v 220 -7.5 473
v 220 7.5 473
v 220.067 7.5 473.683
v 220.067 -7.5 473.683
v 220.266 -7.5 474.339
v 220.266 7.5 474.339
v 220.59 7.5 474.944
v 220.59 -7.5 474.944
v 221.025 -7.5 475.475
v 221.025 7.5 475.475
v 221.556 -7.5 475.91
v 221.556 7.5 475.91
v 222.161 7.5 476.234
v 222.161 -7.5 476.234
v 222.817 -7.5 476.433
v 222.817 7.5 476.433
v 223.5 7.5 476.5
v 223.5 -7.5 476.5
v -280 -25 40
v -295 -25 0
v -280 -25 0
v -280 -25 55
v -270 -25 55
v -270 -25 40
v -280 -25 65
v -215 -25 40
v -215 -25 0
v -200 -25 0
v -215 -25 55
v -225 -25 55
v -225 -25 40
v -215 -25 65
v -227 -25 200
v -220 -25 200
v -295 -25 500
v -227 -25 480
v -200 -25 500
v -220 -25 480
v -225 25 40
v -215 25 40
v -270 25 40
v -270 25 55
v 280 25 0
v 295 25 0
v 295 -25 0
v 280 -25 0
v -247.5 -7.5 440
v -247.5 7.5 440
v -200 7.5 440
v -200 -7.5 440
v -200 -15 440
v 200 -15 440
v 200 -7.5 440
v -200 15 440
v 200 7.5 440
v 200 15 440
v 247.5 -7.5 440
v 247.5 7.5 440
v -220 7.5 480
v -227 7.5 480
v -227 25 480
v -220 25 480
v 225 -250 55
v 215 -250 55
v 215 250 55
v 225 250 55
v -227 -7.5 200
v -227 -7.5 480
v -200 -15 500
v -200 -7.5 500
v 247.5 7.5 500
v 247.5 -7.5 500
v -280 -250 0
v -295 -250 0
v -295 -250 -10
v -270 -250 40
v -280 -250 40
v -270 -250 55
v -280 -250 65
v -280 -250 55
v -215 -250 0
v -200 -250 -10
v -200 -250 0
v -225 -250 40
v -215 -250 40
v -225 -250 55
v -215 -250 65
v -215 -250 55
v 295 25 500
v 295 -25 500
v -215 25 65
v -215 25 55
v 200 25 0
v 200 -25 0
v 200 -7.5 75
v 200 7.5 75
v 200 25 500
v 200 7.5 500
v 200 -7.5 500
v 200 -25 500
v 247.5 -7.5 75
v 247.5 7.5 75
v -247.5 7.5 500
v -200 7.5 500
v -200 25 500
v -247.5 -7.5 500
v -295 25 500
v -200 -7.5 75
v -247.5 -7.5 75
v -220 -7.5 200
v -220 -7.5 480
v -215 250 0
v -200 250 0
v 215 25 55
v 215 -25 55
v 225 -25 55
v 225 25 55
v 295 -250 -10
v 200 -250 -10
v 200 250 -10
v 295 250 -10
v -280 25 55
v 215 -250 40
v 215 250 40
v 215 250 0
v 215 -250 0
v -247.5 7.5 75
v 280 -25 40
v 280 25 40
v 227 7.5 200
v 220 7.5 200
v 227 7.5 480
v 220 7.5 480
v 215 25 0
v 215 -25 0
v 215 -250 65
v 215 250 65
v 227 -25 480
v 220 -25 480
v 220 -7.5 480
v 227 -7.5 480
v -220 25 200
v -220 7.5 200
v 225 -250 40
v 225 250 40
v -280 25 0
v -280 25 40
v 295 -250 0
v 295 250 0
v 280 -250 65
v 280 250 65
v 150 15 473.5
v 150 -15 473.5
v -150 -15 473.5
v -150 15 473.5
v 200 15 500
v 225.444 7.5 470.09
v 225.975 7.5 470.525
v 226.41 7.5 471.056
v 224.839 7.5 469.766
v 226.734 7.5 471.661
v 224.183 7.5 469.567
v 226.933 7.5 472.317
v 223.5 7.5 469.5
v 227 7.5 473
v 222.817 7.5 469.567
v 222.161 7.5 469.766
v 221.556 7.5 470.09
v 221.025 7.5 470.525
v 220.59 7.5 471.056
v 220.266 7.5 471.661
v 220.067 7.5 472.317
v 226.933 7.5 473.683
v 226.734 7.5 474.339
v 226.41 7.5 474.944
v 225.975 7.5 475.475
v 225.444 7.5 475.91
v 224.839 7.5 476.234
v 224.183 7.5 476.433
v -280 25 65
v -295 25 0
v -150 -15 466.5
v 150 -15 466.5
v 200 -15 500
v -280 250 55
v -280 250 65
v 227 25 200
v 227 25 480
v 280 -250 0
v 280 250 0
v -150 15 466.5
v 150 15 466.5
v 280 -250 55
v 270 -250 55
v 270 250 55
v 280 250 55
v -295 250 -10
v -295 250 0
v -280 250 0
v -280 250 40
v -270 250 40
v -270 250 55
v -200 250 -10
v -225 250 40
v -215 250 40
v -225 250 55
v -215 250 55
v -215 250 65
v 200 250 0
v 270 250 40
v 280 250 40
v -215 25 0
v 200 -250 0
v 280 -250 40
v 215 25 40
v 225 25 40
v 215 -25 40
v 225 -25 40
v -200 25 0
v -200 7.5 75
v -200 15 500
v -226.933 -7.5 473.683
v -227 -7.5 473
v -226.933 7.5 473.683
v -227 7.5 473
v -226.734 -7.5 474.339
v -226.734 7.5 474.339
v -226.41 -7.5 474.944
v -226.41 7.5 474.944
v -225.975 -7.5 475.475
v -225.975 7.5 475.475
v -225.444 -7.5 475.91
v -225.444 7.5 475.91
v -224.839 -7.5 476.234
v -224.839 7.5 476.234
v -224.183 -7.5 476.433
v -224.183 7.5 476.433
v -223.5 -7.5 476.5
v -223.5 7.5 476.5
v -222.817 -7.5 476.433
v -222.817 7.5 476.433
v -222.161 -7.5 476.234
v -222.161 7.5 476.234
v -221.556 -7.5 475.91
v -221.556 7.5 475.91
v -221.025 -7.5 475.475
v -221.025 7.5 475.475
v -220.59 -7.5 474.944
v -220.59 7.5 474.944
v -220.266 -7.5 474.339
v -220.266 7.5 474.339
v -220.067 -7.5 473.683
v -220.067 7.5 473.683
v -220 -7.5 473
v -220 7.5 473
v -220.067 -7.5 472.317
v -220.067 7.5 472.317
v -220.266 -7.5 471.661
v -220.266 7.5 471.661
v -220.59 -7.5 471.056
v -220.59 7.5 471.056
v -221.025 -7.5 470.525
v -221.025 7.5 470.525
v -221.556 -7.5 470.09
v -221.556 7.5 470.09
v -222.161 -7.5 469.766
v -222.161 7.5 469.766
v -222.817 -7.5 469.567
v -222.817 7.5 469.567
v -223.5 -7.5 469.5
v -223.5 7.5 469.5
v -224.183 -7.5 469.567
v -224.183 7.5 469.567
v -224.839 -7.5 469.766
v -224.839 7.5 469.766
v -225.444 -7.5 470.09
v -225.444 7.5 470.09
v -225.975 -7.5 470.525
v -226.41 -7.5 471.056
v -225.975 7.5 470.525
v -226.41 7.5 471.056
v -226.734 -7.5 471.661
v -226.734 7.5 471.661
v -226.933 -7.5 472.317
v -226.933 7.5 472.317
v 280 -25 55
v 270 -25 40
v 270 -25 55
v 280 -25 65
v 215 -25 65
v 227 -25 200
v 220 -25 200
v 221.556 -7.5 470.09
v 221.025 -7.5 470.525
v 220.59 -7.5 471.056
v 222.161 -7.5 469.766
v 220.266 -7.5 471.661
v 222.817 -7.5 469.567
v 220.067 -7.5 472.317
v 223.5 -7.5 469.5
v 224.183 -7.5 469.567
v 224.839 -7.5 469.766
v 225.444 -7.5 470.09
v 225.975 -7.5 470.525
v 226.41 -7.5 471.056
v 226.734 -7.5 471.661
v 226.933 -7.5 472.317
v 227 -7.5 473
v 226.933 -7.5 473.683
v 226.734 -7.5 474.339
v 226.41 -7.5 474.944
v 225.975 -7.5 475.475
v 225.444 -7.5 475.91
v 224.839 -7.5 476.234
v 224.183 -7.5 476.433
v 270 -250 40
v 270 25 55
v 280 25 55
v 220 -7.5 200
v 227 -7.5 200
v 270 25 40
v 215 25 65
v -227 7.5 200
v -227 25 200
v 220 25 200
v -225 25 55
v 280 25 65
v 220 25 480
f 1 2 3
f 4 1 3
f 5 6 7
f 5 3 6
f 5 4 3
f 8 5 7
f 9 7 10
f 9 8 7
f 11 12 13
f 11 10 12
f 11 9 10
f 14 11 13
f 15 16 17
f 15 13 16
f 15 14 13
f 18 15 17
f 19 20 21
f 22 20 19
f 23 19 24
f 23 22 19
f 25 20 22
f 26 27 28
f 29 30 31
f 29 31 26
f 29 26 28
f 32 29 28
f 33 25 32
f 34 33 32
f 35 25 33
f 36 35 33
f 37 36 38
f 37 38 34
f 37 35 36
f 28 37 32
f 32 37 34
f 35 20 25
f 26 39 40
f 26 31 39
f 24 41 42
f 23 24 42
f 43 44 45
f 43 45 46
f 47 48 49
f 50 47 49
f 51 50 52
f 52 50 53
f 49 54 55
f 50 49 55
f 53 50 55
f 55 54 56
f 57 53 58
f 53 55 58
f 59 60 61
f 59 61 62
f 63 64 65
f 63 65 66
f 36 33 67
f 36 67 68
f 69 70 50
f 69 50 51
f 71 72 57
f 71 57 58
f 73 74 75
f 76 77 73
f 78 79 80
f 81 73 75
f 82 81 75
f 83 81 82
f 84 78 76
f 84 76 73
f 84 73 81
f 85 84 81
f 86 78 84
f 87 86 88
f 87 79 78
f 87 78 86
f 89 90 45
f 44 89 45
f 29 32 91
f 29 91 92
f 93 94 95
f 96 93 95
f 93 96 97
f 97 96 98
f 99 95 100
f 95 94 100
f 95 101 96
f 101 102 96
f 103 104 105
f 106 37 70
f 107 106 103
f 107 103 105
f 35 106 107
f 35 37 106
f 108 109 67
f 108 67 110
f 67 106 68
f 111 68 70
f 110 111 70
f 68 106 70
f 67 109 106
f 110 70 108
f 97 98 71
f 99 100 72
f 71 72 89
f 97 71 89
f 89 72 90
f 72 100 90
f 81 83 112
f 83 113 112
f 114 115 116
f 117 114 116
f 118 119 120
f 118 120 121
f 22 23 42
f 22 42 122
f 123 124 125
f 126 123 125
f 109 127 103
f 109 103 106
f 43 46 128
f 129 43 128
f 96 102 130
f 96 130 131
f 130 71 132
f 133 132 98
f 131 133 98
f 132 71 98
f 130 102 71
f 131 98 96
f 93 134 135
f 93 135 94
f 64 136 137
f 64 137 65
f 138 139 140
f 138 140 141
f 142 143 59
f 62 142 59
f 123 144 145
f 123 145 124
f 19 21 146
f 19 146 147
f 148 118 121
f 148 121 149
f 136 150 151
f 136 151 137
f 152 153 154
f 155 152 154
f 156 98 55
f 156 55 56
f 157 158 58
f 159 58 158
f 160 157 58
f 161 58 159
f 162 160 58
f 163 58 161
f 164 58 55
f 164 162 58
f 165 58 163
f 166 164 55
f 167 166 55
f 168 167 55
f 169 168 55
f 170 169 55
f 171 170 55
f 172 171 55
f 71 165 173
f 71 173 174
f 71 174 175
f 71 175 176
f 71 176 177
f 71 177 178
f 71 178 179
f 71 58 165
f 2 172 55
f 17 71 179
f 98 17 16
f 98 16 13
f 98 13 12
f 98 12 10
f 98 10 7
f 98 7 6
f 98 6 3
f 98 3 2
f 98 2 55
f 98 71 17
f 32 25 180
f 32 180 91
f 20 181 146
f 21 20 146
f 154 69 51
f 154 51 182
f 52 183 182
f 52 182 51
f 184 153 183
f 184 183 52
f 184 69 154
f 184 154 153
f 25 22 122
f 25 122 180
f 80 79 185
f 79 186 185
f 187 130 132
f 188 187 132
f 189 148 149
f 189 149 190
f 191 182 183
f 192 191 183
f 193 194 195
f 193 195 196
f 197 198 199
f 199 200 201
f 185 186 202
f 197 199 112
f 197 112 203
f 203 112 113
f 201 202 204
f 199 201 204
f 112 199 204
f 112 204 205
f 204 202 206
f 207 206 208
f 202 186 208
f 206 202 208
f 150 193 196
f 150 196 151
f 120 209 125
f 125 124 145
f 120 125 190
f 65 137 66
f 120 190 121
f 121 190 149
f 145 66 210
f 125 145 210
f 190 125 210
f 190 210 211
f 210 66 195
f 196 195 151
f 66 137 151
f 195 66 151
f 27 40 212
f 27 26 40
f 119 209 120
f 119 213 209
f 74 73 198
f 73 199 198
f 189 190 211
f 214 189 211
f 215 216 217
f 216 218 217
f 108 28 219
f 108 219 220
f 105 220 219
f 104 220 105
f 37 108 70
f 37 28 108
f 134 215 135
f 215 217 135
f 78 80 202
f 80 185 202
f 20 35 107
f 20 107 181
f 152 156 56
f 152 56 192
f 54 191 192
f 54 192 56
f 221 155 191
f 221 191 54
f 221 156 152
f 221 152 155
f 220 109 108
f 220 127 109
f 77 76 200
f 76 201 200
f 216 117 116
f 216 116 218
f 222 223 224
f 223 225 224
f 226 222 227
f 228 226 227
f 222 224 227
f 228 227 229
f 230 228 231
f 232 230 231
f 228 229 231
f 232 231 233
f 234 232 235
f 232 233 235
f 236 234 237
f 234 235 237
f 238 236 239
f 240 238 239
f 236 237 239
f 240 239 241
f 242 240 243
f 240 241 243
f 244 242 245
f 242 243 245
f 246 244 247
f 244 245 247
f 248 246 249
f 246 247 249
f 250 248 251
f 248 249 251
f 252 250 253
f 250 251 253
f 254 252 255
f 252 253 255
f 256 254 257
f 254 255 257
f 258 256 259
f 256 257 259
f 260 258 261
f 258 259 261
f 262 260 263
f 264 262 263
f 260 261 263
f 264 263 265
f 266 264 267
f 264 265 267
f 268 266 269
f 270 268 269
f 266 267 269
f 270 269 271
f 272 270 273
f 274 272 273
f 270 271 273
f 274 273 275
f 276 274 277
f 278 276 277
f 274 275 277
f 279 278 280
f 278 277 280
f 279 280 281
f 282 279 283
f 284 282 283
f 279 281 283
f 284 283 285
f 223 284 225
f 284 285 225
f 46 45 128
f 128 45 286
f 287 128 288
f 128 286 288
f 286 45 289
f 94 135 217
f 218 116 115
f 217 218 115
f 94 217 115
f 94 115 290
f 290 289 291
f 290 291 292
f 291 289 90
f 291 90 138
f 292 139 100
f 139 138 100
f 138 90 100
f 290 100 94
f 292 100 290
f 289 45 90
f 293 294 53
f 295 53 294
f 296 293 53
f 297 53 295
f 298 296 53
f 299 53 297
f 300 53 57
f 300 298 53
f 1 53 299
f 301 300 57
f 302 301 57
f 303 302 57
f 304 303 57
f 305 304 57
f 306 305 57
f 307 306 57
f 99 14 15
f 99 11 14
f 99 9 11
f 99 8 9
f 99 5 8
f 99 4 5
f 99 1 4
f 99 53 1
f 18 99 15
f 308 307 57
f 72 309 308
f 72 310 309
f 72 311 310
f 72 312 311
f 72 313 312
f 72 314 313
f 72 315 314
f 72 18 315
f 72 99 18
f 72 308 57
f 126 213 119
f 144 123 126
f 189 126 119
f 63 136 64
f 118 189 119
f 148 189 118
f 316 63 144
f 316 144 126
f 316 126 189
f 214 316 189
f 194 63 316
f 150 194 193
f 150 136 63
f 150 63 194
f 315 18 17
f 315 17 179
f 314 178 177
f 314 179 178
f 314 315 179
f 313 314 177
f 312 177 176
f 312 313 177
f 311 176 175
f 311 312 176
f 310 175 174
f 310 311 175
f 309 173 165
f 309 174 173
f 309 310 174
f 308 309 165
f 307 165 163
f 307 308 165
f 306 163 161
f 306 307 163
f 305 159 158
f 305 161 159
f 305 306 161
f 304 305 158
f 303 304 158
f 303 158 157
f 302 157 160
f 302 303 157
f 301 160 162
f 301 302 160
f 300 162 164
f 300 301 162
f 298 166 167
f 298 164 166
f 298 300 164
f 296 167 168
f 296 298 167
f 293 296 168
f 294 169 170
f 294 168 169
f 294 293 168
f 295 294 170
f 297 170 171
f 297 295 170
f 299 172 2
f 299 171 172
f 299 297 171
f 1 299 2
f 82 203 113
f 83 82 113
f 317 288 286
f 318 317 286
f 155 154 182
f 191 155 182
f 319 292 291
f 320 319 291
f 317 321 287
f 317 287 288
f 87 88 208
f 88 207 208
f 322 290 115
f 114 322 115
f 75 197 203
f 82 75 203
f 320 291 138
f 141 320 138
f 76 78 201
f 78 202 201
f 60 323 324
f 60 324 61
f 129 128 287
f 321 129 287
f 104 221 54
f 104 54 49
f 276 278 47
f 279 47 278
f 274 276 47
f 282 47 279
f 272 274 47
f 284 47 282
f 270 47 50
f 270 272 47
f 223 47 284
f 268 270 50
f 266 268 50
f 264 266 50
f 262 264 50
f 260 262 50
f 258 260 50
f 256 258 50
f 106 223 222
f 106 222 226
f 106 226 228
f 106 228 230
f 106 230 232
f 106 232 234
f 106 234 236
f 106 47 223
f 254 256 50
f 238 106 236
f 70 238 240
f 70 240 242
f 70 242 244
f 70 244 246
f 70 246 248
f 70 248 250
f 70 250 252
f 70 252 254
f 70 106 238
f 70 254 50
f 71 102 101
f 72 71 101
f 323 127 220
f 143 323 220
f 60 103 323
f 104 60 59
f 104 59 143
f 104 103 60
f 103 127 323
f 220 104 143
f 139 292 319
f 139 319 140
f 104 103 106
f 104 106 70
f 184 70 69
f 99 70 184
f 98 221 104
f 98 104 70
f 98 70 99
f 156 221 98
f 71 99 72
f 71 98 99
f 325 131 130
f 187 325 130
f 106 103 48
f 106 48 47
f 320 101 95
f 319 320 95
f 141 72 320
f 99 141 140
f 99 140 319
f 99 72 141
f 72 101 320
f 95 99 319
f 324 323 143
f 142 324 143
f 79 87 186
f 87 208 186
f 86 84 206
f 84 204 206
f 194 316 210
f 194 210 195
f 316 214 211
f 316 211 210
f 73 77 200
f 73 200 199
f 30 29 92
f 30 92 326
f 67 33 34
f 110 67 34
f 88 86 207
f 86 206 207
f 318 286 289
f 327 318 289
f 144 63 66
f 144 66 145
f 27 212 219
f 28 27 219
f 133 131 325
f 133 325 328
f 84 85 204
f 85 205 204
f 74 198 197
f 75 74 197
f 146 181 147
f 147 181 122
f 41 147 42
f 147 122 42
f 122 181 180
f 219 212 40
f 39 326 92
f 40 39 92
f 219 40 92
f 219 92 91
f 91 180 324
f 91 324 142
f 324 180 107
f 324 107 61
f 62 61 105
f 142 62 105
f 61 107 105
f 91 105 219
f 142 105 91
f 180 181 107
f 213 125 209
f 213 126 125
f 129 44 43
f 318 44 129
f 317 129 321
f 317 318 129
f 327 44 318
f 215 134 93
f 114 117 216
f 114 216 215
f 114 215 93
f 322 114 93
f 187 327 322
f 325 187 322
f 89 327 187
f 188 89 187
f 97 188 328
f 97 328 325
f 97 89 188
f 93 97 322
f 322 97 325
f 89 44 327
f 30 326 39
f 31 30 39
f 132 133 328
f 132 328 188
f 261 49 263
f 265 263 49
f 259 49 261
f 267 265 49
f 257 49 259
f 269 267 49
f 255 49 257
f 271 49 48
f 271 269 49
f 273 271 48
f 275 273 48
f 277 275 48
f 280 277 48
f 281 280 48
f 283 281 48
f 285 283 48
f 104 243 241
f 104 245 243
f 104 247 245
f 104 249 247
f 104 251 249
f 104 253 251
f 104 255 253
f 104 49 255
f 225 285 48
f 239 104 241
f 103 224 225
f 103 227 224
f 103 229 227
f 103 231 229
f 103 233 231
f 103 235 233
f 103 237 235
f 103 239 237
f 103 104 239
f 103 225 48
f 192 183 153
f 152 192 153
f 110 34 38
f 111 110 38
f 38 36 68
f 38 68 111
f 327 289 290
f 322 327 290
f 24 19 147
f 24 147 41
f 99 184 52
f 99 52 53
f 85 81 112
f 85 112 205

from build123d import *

# Parameters (mm, degrees)
F1_DEPTH  = 250
F3_DEPTH  = 25
F4_W      = 47.5
F4_H      = 7.5
F5_DEPTH  = 425
F7_W      = 7
F7_H      = 280
F8_DEPTH  = 110
F10_DEPTH = 60
F11_R     = 3.5
F12_DEPTH = 56
F14_DEPTH = 46


with BuildPart() as f1:
    # F0 (on Front) → F1 (new body, symmetric)
    with BuildSketch(Plane.XZ):
        Polygon((-200, -10), (-200, 0), (-215, 0), (-280, 0), (-295, 0), (-295, -10), (-280, -10), align=None)
        Polygon((215, 0), (200, 0), (200, -10), (280, -10), (295, -10), (295, 0), (280, 0), align=None)
        Polygon((-280, 0), (-215, 0), (-215, 40), (-225, 40), (-225, 55), (-215, 55), (-215, 65), (-280, 65), (-280, 55), (-270, 55), (-270, 40), (-280, 40), align=None)
        Polygon((215, 40), (215, 0), (280, 0), (280, 40), (270, 40), (270, 55), (280, 55), (280, 65), (215, 65), (215, 55), (225, 55), (225, 40), align=None)
    extrude(amount=F1_DEPTH, both=True)


with BuildPart() as f3:
    # F2 (on Front) → F3 (new body, symmetric)
    with BuildSketch(Plane.XZ):
        Polygon((-215, 0), (-200, 0), (-200, 500), (-295, 500), (-295, 0), (-280, 0), (-280, 40), (-270, 40), (-270, 55), (-280, 55), (-280, 65), (-215, 65), (-215, 55), (-225, 55), (-225, 40), (-215, 40), align=None)
    extrude(amount=F3_DEPTH, both=True)

    # F4 (on face) → F5 (cut)
    with BuildSketch(Plane.XY.offset(500)):
        with Locations((-223.75, -3.75)):
            Rectangle(F4_W, F4_H)
        with Locations((-223.75, 3.75)):
            Rectangle(F4_W, F4_H)
    extrude(amount=-F5_DEPTH, mode=Mode.SUBTRACT)


with BuildPart() as f6_1:
    # F6: instance of F3
    add(f3.part.mirror(Plane.YZ))


with BuildPart() as f8_tool:
    # F7 (on face) → F8 (new body)
    with BuildSketch(Plane.XZ.offset(25)):
        with Locations((-223.5, 340)):
            Rectangle(F7_W, F7_H)
        with Locations((223.5, 340)):
            Rectangle(F7_W, F7_H)
    extrude(amount=-F8_DEPTH)


with BuildPart() as f3_1:
    add(f3.part)

    # F8: cut by f8_tool
    add(f8_tool.part, mode=Mode.SUBTRACT)


with BuildPart() as f6_1_1:
    add(f6_1.part)

    # F8: cut by f8_tool
    add(f8_tool.part, mode=Mode.SUBTRACT)


with BuildPart() as f10:
    # F9 (on face) → F10 (new body)
    with BuildSketch(Plane.XY.offset(500)):
        Polygon((-200, -7.5), (-200, -15), (0, -15), (200, -15), (200, -7.5), (247.5, -7.5), (247.5, 7.5), (200, 7.5), (200, 15), (0, 15), (-200, 15), (-200, 7.5), (-247.5, 7.5), (-247.5, -7.5), align=None)
    extrude(amount=-F10_DEPTH)

    # F11 (on face) → F12 (cut, symmetric)
    with BuildSketch(Plane(origin=(0, 7.5, 0), x_dir=(-1, 0, 0), z_dir=(0, 1, 0))):
        with BuildLine():
            ThreePointArc((-220, 473), (-221.025126, 475.474874), (-223.5, 476.5))
            ThreePointArc((-223.5, 476.5), (-225.974874, 470.525126), (-220, 473))
        make_face()
        with Locations((223.5, 473)):
            Circle(F11_R)
    extrude(amount=F12_DEPTH, both=True, mode=Mode.SUBTRACT)

    # F13 (on face) → F14 (cut)
    with BuildSketch(Plane.XZ.offset(15)):
        Polygon((-150, 473.5), (-150, 470), (-150, 466.5), (0, 466.5), (150, 466.5), (150, 473.5), (0, 473.5), align=None)
    extrude(amount=-F14_DEPTH, mode=Mode.SUBTRACT)


solid = Compound([f1.part, f3_1.part, f6_1_1.part, f10.part])
